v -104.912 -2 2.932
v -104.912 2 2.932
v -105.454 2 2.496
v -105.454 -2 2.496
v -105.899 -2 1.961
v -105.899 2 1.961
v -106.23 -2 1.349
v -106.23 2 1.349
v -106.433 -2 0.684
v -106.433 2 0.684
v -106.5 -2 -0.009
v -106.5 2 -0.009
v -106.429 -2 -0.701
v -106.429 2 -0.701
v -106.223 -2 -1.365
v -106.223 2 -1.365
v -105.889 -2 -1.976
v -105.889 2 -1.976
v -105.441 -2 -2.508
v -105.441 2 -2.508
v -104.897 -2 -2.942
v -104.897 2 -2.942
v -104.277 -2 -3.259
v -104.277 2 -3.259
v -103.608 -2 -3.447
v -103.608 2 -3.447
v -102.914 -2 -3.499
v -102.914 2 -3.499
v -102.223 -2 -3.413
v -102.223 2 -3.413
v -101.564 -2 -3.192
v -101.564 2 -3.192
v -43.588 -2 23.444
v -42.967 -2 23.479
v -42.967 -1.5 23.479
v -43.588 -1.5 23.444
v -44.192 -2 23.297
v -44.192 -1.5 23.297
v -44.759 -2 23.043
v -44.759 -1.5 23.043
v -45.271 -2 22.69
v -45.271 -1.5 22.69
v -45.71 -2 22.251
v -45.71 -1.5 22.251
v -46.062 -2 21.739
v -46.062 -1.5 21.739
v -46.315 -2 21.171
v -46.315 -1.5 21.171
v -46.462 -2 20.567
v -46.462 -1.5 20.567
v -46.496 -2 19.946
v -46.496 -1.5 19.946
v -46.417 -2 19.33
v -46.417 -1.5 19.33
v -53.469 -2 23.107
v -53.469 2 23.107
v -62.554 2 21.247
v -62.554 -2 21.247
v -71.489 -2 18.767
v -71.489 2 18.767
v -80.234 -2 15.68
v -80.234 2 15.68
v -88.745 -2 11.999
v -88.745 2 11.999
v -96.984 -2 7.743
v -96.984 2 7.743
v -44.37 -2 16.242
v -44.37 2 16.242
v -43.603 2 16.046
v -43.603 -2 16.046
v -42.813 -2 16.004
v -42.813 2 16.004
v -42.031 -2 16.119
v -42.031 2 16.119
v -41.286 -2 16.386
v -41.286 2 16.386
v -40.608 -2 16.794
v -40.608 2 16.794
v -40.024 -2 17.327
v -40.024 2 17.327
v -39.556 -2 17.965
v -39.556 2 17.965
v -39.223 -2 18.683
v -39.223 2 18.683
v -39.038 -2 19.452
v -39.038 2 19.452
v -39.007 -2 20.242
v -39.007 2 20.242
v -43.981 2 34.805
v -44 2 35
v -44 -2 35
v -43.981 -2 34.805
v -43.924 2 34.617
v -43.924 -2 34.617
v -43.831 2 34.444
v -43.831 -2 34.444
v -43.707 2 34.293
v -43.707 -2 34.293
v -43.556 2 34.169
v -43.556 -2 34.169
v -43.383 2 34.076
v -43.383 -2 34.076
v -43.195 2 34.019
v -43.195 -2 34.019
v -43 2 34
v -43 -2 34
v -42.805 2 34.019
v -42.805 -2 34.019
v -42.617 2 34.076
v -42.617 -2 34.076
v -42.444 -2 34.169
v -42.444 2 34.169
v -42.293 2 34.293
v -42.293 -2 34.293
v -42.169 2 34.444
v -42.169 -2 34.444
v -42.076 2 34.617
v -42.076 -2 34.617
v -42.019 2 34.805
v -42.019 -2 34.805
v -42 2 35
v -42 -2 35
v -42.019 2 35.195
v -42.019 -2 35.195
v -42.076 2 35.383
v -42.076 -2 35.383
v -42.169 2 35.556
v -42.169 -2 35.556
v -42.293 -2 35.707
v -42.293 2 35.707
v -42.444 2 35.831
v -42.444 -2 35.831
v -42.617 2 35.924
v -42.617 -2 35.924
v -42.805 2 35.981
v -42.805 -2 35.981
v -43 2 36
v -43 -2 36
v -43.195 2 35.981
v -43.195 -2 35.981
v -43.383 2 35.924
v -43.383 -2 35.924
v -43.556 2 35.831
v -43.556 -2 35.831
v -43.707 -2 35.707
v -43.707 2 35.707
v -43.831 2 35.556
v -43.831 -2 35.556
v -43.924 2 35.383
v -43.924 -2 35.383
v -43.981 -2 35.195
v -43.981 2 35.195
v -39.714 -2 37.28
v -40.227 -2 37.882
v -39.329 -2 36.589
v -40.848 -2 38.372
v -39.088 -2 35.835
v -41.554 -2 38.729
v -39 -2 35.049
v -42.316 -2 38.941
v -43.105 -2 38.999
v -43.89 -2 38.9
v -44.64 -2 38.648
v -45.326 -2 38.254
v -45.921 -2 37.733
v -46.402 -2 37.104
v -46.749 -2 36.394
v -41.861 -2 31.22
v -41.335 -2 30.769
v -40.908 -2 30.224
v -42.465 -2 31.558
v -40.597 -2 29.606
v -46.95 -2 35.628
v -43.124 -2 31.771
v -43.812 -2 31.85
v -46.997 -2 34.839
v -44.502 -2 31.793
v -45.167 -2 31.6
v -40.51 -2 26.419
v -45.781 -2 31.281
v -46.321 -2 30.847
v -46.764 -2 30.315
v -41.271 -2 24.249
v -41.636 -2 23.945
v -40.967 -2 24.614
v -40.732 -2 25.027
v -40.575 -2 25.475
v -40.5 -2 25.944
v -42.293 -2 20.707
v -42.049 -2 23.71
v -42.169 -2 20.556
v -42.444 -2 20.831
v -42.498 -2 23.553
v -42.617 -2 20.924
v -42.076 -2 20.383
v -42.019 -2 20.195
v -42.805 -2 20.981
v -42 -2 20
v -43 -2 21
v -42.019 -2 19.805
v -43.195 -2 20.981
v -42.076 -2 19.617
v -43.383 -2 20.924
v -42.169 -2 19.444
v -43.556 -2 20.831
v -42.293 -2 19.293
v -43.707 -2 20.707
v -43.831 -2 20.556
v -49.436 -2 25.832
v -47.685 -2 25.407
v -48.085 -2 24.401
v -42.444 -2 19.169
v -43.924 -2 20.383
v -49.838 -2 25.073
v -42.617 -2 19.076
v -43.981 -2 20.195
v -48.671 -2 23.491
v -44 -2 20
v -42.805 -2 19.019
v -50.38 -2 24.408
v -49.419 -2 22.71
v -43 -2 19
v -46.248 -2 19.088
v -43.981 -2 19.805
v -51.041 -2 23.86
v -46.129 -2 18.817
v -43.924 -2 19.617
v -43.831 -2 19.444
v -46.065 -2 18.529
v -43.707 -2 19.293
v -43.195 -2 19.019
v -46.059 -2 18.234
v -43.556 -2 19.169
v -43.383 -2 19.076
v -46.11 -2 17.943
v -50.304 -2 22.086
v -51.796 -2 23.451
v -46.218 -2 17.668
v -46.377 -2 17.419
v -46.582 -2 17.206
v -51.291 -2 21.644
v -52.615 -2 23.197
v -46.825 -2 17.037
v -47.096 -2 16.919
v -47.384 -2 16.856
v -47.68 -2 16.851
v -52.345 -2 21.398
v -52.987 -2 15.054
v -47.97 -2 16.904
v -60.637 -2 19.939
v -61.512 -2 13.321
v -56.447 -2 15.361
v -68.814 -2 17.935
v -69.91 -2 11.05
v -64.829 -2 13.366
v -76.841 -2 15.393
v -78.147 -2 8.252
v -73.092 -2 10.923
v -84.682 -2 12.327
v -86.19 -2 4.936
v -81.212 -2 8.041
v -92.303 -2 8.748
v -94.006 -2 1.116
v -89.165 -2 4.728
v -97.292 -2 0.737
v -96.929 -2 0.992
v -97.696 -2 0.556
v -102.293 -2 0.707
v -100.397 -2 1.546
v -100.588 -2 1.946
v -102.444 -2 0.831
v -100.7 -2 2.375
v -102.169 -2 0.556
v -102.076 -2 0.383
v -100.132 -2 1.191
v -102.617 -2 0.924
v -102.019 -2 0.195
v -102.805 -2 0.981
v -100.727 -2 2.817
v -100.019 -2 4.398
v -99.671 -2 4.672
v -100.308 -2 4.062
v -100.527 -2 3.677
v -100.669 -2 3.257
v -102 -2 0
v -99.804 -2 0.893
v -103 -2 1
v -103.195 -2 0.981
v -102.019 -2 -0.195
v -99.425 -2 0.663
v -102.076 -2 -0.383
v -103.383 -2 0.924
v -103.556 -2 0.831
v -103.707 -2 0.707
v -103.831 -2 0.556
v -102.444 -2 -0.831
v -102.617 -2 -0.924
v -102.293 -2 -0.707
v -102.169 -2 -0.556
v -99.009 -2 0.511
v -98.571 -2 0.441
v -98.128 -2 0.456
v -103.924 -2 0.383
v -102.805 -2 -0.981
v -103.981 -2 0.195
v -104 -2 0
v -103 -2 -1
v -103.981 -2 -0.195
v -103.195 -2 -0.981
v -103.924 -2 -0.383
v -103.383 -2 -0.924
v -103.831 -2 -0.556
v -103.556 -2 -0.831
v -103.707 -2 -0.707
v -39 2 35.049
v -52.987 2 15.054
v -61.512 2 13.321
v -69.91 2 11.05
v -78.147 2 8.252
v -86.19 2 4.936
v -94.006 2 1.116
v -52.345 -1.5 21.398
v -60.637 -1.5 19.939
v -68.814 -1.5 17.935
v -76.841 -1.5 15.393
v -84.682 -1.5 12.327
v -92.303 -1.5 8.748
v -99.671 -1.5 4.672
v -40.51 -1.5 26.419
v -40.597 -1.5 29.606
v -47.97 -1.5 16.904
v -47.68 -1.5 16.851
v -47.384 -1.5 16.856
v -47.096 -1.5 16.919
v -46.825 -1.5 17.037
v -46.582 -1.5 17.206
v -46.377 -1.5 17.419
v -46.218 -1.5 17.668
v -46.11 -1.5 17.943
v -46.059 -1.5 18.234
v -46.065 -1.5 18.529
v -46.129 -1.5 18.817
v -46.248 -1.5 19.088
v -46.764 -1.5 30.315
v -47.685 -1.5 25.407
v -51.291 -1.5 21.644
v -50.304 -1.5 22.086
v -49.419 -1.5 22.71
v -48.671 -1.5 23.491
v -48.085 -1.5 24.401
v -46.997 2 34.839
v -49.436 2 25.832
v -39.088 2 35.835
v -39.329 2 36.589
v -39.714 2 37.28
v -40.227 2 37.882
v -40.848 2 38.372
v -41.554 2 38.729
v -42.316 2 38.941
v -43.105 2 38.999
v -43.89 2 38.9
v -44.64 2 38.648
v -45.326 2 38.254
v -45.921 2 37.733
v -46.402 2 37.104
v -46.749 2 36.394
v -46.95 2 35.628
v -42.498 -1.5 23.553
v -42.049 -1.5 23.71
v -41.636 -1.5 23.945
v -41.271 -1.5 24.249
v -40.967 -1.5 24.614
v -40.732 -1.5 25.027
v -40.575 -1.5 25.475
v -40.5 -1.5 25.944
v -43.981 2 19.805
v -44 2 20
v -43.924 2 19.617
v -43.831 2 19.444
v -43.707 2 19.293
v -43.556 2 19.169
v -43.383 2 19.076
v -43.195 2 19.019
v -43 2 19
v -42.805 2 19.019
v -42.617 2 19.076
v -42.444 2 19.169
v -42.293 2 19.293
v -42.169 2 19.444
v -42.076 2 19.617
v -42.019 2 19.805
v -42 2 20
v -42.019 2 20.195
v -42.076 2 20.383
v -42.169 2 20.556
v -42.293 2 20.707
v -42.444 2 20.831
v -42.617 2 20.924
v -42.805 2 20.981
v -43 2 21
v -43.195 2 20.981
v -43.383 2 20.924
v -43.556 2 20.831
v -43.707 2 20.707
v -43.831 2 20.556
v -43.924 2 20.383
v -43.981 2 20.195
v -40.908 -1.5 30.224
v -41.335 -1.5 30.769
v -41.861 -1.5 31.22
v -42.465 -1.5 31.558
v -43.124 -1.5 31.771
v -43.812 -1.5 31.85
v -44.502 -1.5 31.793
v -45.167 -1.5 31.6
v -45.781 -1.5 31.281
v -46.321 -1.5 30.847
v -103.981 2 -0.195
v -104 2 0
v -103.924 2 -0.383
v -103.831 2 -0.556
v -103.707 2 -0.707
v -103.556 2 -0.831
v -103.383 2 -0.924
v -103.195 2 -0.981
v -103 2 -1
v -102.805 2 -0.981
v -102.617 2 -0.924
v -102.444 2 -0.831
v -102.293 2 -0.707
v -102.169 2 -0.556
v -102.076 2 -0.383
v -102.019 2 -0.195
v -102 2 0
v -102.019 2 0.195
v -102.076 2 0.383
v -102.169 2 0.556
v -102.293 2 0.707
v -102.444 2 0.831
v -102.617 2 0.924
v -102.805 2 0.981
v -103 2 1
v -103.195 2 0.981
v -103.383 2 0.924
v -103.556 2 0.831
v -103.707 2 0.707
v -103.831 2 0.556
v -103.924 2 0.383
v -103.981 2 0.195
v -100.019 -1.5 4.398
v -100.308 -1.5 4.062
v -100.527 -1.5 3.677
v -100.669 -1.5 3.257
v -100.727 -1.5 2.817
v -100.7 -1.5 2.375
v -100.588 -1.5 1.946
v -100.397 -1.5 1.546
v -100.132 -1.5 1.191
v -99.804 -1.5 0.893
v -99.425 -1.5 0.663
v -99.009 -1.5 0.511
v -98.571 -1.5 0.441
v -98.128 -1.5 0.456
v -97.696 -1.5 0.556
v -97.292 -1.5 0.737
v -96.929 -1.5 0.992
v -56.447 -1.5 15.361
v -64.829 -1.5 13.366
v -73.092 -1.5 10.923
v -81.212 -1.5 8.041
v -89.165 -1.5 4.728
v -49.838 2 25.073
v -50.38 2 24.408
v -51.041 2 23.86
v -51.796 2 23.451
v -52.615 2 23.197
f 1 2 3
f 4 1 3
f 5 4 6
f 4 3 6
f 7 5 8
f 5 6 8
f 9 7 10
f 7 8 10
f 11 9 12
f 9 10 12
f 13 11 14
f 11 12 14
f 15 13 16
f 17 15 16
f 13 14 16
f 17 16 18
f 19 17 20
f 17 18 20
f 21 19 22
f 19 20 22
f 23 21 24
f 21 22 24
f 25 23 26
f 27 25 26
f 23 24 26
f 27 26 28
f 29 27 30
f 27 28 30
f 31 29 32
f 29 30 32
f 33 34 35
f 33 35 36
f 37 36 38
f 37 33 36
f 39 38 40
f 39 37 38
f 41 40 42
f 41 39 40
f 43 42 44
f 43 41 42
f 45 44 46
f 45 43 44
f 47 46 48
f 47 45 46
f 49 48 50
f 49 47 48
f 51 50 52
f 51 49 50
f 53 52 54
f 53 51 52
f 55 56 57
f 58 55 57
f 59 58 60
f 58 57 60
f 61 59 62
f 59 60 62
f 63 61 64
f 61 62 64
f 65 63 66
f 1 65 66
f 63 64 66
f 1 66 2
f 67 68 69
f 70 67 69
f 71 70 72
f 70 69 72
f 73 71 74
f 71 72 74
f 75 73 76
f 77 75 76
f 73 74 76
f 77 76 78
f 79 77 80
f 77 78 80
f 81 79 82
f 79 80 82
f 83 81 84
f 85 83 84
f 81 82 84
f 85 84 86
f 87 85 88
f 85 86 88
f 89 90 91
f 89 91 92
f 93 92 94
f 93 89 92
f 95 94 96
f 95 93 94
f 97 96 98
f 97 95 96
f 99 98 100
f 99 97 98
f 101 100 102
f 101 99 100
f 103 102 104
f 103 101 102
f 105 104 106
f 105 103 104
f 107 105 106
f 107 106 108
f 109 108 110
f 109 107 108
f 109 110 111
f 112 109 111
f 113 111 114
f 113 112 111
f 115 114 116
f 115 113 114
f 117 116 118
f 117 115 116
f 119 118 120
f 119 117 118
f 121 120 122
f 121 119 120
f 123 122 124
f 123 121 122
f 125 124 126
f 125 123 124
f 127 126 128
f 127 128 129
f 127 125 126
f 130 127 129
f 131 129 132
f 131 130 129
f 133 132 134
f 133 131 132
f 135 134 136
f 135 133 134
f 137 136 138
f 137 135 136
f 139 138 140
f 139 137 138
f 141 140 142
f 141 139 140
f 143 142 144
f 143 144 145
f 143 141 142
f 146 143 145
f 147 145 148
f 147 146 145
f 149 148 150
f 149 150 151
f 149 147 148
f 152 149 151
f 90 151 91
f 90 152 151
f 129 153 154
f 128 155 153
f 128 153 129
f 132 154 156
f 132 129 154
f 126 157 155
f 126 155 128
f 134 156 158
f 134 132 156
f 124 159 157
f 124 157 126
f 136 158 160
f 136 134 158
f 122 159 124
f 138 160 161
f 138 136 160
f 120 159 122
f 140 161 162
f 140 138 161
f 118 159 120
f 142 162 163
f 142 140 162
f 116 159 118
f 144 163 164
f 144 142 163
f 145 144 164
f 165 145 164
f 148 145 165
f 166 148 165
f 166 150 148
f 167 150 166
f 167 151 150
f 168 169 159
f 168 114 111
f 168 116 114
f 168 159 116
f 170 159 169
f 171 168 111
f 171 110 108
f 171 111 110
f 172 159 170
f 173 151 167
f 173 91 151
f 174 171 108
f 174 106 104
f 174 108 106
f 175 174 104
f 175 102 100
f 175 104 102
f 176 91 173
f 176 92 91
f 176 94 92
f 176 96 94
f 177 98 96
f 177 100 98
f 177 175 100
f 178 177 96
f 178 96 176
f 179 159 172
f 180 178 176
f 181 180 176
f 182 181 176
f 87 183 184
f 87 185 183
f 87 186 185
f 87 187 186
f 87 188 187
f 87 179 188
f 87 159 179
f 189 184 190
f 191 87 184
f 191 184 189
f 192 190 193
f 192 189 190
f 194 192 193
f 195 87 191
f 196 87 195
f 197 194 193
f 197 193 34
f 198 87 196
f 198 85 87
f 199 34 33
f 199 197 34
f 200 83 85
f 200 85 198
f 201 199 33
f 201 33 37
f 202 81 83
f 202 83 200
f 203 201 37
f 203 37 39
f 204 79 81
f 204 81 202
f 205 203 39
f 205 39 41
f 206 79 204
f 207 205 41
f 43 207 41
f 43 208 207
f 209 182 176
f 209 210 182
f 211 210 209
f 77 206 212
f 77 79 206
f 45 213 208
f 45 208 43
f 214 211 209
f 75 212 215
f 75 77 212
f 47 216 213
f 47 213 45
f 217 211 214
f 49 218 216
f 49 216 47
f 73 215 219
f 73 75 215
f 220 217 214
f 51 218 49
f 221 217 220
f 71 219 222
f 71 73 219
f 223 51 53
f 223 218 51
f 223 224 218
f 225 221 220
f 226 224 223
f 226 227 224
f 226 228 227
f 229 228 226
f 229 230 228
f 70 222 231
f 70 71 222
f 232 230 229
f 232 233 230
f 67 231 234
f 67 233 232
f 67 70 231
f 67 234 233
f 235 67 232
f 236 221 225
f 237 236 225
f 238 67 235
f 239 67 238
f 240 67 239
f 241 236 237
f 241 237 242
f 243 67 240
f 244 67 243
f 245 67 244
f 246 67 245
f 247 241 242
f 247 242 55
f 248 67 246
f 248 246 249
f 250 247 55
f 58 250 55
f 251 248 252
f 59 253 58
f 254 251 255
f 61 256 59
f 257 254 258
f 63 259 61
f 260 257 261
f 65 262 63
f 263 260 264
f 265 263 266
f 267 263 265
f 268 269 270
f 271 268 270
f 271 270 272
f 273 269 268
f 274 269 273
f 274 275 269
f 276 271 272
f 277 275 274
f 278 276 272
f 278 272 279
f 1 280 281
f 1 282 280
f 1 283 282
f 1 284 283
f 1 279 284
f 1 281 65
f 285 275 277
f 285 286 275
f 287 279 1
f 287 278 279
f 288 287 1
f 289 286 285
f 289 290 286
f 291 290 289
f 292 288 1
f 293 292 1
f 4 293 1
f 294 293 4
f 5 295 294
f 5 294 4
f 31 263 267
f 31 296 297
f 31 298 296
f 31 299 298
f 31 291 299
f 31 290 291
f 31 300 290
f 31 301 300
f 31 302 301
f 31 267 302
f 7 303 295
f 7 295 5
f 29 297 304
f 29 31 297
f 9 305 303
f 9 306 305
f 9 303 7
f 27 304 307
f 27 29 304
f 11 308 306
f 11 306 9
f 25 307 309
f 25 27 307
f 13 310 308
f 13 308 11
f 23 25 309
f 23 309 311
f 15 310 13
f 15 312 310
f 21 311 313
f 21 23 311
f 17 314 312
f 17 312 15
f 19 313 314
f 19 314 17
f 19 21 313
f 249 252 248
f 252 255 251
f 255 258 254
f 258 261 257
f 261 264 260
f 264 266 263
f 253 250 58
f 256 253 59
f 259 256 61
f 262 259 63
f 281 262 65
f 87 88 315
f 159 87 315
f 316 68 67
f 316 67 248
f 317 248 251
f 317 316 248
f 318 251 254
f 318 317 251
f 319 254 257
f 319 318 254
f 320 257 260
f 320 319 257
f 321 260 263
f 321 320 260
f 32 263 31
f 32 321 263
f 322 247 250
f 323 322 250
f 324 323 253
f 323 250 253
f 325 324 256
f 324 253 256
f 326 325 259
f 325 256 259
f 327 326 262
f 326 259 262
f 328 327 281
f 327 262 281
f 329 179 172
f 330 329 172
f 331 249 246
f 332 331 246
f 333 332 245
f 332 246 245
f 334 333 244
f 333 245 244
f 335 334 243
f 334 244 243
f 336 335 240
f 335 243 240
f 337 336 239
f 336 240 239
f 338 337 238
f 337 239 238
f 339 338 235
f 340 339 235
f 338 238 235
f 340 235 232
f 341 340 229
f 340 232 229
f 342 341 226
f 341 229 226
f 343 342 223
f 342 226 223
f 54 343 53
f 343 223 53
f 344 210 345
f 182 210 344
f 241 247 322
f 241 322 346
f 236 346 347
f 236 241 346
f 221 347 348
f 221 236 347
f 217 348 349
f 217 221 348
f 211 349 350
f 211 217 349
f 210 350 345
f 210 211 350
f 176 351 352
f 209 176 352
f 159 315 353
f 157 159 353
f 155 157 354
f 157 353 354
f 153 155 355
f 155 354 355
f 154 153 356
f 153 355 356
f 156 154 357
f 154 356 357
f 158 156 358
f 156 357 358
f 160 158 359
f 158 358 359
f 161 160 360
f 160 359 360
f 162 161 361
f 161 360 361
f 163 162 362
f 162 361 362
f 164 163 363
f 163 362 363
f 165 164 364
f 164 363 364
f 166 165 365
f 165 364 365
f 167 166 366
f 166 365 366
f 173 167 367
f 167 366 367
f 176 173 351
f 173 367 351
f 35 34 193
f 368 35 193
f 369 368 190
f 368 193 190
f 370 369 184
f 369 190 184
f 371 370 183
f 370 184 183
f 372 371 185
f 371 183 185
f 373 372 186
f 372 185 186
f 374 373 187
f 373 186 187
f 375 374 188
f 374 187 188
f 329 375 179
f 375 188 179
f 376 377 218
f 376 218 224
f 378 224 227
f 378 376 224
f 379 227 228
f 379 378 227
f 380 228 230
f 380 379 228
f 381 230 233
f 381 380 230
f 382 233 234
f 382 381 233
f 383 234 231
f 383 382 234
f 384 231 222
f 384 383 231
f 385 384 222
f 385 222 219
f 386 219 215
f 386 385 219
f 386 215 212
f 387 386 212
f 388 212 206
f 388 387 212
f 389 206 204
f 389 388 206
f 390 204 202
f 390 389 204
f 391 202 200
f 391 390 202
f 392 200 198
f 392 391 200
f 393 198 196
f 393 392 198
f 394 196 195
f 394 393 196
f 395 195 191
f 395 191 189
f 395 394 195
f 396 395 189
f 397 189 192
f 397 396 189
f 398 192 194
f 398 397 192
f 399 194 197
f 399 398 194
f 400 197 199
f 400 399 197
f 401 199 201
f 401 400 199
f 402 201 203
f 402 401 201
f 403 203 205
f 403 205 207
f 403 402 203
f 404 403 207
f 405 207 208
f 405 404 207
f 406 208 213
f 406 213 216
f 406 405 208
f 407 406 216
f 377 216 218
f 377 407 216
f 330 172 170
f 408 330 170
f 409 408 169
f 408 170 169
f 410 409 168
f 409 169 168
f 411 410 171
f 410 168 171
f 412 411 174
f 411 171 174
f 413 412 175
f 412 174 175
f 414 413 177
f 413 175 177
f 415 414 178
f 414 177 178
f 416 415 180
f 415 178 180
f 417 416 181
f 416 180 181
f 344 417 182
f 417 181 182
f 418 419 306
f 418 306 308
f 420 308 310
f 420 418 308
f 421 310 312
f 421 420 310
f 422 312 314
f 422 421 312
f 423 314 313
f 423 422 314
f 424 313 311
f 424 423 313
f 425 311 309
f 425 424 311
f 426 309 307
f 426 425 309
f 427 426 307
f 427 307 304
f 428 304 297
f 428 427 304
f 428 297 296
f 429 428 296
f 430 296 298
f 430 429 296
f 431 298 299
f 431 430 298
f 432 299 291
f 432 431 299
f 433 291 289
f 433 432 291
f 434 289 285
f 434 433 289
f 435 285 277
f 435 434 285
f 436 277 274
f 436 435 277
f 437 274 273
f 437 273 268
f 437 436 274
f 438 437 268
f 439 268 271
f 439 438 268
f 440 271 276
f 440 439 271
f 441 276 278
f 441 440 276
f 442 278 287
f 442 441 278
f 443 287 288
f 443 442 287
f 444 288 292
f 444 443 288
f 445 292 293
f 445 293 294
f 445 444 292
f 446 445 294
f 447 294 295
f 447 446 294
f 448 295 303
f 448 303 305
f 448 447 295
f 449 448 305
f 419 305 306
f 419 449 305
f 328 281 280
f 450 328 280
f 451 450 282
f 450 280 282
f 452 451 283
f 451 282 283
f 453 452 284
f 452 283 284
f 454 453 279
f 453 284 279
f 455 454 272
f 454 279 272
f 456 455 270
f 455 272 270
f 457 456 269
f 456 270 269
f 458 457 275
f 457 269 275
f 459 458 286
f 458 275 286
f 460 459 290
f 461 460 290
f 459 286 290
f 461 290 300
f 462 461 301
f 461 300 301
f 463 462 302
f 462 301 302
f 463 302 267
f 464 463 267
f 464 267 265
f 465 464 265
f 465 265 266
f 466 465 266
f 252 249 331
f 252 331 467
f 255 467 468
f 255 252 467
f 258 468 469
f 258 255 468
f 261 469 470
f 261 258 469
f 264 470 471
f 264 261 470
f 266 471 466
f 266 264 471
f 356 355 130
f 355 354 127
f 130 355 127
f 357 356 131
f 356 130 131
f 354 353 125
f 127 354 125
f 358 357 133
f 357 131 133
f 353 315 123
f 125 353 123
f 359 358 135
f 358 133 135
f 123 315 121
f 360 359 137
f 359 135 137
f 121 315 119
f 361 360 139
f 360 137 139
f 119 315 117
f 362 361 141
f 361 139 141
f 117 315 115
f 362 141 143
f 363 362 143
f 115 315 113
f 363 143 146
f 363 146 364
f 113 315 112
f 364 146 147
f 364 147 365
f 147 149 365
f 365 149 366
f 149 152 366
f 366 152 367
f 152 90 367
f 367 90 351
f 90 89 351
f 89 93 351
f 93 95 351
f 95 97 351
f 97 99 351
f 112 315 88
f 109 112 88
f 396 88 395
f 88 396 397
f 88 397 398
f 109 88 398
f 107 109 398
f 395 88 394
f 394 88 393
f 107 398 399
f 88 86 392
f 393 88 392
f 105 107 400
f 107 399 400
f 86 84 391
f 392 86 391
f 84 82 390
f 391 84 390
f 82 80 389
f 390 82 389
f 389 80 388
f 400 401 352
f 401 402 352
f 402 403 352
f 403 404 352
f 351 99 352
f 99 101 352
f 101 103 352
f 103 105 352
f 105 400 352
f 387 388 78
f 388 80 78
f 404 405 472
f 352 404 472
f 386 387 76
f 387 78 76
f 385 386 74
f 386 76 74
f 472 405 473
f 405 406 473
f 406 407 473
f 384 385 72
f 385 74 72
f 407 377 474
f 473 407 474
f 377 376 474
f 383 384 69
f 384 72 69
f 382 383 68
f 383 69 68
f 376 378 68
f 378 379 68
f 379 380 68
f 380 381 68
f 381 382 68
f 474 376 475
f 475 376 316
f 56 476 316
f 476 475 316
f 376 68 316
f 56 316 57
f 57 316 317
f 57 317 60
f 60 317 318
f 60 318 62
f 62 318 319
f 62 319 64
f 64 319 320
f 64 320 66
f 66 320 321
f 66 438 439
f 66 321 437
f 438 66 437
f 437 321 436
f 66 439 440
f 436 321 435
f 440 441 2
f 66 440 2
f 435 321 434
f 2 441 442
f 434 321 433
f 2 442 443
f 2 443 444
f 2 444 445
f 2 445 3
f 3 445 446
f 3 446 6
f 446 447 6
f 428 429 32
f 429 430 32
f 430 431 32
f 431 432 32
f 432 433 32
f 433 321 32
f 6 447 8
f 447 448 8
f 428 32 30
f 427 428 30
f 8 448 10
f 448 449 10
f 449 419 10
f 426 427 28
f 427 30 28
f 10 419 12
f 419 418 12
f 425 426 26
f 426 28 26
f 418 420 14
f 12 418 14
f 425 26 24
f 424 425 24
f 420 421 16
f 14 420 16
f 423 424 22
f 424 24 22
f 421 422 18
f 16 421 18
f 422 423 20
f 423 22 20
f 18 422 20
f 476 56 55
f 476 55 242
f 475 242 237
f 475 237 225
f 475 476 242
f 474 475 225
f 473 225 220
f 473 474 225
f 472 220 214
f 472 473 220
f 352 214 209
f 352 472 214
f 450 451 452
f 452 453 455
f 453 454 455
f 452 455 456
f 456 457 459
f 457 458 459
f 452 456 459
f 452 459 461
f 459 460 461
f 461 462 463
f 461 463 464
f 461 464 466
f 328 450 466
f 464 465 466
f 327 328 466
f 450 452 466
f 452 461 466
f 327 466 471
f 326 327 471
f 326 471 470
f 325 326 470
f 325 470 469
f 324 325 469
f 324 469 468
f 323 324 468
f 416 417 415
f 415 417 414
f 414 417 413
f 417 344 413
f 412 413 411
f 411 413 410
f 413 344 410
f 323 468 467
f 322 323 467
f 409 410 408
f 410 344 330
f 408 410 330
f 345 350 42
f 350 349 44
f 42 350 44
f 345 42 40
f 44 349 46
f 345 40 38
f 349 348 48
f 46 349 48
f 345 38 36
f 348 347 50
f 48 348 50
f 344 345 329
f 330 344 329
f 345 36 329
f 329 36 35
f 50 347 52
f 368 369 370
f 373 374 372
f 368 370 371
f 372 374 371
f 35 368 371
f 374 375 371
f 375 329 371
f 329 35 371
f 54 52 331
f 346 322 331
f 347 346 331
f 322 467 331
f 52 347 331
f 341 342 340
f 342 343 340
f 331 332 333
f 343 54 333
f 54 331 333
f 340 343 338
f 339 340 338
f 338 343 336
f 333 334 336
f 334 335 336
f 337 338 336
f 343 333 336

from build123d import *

# Parameters (mm, degrees)
SKETCH_R     = 1
PAD_DEPTH    = 4
POCKET_DEPTH = 0.5


with BuildPart() as part:
    # Sketch → Pad (new body)
    with BuildSketch(Plane(origin=(-43, 2, 10), x_dir=(-1, 0, 0), z_dir=(0, -1, 0))):
        with BuildLine():
            ThreePointArc((1.369567, -6.241771), (-2.39195, -6.793979), (-3.992648, -10.242416))
            Line((-3.992648, -10.242416), (-3.999699, -25.049081))
            ThreePointArc((-3.999699, -25.049081), (0.10526, -28.998615), (3.996742, -24.838581))
            Line((3.996742, -24.838581), (6.436421, -15.831628))
            ThreePointArc((10.468861, -13.107373), (8.040921, -13.860073), (6.436421, -15.831628))
            ThreePointArc((10.468861, -13.107373), (37.233561, -5.679802), (61.911635, 7.068166))
            ThreePointArc((61.911635, 7.068166), (63.070989, 11.678996), (58.563715, 13.191721))
            ThreePointArc((1.369567, -6.241771), (31.05105, 0.283484), (58.563715, 13.191721))
        make_face()
        with Locations((0, -10)):
            Circle(SKETCH_R, mode=Mode.SUBTRACT)
        with Locations((60, 10)):
            Circle(SKETCH_R, mode=Mode.SUBTRACT)
        with Locations((0, -25)):
            Circle(SKETCH_R, mode=Mode.SUBTRACT)
    extrude(amount=PAD_DEPTH)

    # Sketch001 → Pocket (cut)
    with BuildSketch(Plane(origin=(-43, -2, 10), x_dir=(-1, 0, 0), z_dir=(0, -1, 0))):
        with BuildLine():
            ThreePointArc((-0.032814, -13.479149), (2.709829, -12.250672), (3.417072, -9.329876))
            ThreePointArc((4.97037, -6.903931), (3.291608, -7.539293), (3.417072, -9.329876))
            ThreePointArc((4.97037, -6.903931), (30.091825, -0.923478), (53.929252, 9.007808))
            ThreePointArc((56.670903, 5.328015), (57.272793, 8.637695), (53.929252, 9.007808))
            ThreePointArc((9.344748, -11.398275), (33.841325, -5.393473), (56.670903, 5.328015))
            ThreePointArc((9.344748, -11.398275), (6.419172, -12.709963), (4.685346, -15.40688))
            Line((4.685346, -15.40688), (3.764189, -20.315398))
            ThreePointArc((-2.402749, -19.605513), (0.465776, -21.827722), (3.764189, -20.315398))
            Line((-2.489869, -16.419374), (-2.402749, -19.605513))
            ThreePointArc((-0.032814, -13.479149), (-1.889204, -14.424576), (-2.489869, -16.419374))
        make_face()
    extrude(amount=-POCKET_DEPTH, mode=Mode.SUBTRACT)


solid = part.part
